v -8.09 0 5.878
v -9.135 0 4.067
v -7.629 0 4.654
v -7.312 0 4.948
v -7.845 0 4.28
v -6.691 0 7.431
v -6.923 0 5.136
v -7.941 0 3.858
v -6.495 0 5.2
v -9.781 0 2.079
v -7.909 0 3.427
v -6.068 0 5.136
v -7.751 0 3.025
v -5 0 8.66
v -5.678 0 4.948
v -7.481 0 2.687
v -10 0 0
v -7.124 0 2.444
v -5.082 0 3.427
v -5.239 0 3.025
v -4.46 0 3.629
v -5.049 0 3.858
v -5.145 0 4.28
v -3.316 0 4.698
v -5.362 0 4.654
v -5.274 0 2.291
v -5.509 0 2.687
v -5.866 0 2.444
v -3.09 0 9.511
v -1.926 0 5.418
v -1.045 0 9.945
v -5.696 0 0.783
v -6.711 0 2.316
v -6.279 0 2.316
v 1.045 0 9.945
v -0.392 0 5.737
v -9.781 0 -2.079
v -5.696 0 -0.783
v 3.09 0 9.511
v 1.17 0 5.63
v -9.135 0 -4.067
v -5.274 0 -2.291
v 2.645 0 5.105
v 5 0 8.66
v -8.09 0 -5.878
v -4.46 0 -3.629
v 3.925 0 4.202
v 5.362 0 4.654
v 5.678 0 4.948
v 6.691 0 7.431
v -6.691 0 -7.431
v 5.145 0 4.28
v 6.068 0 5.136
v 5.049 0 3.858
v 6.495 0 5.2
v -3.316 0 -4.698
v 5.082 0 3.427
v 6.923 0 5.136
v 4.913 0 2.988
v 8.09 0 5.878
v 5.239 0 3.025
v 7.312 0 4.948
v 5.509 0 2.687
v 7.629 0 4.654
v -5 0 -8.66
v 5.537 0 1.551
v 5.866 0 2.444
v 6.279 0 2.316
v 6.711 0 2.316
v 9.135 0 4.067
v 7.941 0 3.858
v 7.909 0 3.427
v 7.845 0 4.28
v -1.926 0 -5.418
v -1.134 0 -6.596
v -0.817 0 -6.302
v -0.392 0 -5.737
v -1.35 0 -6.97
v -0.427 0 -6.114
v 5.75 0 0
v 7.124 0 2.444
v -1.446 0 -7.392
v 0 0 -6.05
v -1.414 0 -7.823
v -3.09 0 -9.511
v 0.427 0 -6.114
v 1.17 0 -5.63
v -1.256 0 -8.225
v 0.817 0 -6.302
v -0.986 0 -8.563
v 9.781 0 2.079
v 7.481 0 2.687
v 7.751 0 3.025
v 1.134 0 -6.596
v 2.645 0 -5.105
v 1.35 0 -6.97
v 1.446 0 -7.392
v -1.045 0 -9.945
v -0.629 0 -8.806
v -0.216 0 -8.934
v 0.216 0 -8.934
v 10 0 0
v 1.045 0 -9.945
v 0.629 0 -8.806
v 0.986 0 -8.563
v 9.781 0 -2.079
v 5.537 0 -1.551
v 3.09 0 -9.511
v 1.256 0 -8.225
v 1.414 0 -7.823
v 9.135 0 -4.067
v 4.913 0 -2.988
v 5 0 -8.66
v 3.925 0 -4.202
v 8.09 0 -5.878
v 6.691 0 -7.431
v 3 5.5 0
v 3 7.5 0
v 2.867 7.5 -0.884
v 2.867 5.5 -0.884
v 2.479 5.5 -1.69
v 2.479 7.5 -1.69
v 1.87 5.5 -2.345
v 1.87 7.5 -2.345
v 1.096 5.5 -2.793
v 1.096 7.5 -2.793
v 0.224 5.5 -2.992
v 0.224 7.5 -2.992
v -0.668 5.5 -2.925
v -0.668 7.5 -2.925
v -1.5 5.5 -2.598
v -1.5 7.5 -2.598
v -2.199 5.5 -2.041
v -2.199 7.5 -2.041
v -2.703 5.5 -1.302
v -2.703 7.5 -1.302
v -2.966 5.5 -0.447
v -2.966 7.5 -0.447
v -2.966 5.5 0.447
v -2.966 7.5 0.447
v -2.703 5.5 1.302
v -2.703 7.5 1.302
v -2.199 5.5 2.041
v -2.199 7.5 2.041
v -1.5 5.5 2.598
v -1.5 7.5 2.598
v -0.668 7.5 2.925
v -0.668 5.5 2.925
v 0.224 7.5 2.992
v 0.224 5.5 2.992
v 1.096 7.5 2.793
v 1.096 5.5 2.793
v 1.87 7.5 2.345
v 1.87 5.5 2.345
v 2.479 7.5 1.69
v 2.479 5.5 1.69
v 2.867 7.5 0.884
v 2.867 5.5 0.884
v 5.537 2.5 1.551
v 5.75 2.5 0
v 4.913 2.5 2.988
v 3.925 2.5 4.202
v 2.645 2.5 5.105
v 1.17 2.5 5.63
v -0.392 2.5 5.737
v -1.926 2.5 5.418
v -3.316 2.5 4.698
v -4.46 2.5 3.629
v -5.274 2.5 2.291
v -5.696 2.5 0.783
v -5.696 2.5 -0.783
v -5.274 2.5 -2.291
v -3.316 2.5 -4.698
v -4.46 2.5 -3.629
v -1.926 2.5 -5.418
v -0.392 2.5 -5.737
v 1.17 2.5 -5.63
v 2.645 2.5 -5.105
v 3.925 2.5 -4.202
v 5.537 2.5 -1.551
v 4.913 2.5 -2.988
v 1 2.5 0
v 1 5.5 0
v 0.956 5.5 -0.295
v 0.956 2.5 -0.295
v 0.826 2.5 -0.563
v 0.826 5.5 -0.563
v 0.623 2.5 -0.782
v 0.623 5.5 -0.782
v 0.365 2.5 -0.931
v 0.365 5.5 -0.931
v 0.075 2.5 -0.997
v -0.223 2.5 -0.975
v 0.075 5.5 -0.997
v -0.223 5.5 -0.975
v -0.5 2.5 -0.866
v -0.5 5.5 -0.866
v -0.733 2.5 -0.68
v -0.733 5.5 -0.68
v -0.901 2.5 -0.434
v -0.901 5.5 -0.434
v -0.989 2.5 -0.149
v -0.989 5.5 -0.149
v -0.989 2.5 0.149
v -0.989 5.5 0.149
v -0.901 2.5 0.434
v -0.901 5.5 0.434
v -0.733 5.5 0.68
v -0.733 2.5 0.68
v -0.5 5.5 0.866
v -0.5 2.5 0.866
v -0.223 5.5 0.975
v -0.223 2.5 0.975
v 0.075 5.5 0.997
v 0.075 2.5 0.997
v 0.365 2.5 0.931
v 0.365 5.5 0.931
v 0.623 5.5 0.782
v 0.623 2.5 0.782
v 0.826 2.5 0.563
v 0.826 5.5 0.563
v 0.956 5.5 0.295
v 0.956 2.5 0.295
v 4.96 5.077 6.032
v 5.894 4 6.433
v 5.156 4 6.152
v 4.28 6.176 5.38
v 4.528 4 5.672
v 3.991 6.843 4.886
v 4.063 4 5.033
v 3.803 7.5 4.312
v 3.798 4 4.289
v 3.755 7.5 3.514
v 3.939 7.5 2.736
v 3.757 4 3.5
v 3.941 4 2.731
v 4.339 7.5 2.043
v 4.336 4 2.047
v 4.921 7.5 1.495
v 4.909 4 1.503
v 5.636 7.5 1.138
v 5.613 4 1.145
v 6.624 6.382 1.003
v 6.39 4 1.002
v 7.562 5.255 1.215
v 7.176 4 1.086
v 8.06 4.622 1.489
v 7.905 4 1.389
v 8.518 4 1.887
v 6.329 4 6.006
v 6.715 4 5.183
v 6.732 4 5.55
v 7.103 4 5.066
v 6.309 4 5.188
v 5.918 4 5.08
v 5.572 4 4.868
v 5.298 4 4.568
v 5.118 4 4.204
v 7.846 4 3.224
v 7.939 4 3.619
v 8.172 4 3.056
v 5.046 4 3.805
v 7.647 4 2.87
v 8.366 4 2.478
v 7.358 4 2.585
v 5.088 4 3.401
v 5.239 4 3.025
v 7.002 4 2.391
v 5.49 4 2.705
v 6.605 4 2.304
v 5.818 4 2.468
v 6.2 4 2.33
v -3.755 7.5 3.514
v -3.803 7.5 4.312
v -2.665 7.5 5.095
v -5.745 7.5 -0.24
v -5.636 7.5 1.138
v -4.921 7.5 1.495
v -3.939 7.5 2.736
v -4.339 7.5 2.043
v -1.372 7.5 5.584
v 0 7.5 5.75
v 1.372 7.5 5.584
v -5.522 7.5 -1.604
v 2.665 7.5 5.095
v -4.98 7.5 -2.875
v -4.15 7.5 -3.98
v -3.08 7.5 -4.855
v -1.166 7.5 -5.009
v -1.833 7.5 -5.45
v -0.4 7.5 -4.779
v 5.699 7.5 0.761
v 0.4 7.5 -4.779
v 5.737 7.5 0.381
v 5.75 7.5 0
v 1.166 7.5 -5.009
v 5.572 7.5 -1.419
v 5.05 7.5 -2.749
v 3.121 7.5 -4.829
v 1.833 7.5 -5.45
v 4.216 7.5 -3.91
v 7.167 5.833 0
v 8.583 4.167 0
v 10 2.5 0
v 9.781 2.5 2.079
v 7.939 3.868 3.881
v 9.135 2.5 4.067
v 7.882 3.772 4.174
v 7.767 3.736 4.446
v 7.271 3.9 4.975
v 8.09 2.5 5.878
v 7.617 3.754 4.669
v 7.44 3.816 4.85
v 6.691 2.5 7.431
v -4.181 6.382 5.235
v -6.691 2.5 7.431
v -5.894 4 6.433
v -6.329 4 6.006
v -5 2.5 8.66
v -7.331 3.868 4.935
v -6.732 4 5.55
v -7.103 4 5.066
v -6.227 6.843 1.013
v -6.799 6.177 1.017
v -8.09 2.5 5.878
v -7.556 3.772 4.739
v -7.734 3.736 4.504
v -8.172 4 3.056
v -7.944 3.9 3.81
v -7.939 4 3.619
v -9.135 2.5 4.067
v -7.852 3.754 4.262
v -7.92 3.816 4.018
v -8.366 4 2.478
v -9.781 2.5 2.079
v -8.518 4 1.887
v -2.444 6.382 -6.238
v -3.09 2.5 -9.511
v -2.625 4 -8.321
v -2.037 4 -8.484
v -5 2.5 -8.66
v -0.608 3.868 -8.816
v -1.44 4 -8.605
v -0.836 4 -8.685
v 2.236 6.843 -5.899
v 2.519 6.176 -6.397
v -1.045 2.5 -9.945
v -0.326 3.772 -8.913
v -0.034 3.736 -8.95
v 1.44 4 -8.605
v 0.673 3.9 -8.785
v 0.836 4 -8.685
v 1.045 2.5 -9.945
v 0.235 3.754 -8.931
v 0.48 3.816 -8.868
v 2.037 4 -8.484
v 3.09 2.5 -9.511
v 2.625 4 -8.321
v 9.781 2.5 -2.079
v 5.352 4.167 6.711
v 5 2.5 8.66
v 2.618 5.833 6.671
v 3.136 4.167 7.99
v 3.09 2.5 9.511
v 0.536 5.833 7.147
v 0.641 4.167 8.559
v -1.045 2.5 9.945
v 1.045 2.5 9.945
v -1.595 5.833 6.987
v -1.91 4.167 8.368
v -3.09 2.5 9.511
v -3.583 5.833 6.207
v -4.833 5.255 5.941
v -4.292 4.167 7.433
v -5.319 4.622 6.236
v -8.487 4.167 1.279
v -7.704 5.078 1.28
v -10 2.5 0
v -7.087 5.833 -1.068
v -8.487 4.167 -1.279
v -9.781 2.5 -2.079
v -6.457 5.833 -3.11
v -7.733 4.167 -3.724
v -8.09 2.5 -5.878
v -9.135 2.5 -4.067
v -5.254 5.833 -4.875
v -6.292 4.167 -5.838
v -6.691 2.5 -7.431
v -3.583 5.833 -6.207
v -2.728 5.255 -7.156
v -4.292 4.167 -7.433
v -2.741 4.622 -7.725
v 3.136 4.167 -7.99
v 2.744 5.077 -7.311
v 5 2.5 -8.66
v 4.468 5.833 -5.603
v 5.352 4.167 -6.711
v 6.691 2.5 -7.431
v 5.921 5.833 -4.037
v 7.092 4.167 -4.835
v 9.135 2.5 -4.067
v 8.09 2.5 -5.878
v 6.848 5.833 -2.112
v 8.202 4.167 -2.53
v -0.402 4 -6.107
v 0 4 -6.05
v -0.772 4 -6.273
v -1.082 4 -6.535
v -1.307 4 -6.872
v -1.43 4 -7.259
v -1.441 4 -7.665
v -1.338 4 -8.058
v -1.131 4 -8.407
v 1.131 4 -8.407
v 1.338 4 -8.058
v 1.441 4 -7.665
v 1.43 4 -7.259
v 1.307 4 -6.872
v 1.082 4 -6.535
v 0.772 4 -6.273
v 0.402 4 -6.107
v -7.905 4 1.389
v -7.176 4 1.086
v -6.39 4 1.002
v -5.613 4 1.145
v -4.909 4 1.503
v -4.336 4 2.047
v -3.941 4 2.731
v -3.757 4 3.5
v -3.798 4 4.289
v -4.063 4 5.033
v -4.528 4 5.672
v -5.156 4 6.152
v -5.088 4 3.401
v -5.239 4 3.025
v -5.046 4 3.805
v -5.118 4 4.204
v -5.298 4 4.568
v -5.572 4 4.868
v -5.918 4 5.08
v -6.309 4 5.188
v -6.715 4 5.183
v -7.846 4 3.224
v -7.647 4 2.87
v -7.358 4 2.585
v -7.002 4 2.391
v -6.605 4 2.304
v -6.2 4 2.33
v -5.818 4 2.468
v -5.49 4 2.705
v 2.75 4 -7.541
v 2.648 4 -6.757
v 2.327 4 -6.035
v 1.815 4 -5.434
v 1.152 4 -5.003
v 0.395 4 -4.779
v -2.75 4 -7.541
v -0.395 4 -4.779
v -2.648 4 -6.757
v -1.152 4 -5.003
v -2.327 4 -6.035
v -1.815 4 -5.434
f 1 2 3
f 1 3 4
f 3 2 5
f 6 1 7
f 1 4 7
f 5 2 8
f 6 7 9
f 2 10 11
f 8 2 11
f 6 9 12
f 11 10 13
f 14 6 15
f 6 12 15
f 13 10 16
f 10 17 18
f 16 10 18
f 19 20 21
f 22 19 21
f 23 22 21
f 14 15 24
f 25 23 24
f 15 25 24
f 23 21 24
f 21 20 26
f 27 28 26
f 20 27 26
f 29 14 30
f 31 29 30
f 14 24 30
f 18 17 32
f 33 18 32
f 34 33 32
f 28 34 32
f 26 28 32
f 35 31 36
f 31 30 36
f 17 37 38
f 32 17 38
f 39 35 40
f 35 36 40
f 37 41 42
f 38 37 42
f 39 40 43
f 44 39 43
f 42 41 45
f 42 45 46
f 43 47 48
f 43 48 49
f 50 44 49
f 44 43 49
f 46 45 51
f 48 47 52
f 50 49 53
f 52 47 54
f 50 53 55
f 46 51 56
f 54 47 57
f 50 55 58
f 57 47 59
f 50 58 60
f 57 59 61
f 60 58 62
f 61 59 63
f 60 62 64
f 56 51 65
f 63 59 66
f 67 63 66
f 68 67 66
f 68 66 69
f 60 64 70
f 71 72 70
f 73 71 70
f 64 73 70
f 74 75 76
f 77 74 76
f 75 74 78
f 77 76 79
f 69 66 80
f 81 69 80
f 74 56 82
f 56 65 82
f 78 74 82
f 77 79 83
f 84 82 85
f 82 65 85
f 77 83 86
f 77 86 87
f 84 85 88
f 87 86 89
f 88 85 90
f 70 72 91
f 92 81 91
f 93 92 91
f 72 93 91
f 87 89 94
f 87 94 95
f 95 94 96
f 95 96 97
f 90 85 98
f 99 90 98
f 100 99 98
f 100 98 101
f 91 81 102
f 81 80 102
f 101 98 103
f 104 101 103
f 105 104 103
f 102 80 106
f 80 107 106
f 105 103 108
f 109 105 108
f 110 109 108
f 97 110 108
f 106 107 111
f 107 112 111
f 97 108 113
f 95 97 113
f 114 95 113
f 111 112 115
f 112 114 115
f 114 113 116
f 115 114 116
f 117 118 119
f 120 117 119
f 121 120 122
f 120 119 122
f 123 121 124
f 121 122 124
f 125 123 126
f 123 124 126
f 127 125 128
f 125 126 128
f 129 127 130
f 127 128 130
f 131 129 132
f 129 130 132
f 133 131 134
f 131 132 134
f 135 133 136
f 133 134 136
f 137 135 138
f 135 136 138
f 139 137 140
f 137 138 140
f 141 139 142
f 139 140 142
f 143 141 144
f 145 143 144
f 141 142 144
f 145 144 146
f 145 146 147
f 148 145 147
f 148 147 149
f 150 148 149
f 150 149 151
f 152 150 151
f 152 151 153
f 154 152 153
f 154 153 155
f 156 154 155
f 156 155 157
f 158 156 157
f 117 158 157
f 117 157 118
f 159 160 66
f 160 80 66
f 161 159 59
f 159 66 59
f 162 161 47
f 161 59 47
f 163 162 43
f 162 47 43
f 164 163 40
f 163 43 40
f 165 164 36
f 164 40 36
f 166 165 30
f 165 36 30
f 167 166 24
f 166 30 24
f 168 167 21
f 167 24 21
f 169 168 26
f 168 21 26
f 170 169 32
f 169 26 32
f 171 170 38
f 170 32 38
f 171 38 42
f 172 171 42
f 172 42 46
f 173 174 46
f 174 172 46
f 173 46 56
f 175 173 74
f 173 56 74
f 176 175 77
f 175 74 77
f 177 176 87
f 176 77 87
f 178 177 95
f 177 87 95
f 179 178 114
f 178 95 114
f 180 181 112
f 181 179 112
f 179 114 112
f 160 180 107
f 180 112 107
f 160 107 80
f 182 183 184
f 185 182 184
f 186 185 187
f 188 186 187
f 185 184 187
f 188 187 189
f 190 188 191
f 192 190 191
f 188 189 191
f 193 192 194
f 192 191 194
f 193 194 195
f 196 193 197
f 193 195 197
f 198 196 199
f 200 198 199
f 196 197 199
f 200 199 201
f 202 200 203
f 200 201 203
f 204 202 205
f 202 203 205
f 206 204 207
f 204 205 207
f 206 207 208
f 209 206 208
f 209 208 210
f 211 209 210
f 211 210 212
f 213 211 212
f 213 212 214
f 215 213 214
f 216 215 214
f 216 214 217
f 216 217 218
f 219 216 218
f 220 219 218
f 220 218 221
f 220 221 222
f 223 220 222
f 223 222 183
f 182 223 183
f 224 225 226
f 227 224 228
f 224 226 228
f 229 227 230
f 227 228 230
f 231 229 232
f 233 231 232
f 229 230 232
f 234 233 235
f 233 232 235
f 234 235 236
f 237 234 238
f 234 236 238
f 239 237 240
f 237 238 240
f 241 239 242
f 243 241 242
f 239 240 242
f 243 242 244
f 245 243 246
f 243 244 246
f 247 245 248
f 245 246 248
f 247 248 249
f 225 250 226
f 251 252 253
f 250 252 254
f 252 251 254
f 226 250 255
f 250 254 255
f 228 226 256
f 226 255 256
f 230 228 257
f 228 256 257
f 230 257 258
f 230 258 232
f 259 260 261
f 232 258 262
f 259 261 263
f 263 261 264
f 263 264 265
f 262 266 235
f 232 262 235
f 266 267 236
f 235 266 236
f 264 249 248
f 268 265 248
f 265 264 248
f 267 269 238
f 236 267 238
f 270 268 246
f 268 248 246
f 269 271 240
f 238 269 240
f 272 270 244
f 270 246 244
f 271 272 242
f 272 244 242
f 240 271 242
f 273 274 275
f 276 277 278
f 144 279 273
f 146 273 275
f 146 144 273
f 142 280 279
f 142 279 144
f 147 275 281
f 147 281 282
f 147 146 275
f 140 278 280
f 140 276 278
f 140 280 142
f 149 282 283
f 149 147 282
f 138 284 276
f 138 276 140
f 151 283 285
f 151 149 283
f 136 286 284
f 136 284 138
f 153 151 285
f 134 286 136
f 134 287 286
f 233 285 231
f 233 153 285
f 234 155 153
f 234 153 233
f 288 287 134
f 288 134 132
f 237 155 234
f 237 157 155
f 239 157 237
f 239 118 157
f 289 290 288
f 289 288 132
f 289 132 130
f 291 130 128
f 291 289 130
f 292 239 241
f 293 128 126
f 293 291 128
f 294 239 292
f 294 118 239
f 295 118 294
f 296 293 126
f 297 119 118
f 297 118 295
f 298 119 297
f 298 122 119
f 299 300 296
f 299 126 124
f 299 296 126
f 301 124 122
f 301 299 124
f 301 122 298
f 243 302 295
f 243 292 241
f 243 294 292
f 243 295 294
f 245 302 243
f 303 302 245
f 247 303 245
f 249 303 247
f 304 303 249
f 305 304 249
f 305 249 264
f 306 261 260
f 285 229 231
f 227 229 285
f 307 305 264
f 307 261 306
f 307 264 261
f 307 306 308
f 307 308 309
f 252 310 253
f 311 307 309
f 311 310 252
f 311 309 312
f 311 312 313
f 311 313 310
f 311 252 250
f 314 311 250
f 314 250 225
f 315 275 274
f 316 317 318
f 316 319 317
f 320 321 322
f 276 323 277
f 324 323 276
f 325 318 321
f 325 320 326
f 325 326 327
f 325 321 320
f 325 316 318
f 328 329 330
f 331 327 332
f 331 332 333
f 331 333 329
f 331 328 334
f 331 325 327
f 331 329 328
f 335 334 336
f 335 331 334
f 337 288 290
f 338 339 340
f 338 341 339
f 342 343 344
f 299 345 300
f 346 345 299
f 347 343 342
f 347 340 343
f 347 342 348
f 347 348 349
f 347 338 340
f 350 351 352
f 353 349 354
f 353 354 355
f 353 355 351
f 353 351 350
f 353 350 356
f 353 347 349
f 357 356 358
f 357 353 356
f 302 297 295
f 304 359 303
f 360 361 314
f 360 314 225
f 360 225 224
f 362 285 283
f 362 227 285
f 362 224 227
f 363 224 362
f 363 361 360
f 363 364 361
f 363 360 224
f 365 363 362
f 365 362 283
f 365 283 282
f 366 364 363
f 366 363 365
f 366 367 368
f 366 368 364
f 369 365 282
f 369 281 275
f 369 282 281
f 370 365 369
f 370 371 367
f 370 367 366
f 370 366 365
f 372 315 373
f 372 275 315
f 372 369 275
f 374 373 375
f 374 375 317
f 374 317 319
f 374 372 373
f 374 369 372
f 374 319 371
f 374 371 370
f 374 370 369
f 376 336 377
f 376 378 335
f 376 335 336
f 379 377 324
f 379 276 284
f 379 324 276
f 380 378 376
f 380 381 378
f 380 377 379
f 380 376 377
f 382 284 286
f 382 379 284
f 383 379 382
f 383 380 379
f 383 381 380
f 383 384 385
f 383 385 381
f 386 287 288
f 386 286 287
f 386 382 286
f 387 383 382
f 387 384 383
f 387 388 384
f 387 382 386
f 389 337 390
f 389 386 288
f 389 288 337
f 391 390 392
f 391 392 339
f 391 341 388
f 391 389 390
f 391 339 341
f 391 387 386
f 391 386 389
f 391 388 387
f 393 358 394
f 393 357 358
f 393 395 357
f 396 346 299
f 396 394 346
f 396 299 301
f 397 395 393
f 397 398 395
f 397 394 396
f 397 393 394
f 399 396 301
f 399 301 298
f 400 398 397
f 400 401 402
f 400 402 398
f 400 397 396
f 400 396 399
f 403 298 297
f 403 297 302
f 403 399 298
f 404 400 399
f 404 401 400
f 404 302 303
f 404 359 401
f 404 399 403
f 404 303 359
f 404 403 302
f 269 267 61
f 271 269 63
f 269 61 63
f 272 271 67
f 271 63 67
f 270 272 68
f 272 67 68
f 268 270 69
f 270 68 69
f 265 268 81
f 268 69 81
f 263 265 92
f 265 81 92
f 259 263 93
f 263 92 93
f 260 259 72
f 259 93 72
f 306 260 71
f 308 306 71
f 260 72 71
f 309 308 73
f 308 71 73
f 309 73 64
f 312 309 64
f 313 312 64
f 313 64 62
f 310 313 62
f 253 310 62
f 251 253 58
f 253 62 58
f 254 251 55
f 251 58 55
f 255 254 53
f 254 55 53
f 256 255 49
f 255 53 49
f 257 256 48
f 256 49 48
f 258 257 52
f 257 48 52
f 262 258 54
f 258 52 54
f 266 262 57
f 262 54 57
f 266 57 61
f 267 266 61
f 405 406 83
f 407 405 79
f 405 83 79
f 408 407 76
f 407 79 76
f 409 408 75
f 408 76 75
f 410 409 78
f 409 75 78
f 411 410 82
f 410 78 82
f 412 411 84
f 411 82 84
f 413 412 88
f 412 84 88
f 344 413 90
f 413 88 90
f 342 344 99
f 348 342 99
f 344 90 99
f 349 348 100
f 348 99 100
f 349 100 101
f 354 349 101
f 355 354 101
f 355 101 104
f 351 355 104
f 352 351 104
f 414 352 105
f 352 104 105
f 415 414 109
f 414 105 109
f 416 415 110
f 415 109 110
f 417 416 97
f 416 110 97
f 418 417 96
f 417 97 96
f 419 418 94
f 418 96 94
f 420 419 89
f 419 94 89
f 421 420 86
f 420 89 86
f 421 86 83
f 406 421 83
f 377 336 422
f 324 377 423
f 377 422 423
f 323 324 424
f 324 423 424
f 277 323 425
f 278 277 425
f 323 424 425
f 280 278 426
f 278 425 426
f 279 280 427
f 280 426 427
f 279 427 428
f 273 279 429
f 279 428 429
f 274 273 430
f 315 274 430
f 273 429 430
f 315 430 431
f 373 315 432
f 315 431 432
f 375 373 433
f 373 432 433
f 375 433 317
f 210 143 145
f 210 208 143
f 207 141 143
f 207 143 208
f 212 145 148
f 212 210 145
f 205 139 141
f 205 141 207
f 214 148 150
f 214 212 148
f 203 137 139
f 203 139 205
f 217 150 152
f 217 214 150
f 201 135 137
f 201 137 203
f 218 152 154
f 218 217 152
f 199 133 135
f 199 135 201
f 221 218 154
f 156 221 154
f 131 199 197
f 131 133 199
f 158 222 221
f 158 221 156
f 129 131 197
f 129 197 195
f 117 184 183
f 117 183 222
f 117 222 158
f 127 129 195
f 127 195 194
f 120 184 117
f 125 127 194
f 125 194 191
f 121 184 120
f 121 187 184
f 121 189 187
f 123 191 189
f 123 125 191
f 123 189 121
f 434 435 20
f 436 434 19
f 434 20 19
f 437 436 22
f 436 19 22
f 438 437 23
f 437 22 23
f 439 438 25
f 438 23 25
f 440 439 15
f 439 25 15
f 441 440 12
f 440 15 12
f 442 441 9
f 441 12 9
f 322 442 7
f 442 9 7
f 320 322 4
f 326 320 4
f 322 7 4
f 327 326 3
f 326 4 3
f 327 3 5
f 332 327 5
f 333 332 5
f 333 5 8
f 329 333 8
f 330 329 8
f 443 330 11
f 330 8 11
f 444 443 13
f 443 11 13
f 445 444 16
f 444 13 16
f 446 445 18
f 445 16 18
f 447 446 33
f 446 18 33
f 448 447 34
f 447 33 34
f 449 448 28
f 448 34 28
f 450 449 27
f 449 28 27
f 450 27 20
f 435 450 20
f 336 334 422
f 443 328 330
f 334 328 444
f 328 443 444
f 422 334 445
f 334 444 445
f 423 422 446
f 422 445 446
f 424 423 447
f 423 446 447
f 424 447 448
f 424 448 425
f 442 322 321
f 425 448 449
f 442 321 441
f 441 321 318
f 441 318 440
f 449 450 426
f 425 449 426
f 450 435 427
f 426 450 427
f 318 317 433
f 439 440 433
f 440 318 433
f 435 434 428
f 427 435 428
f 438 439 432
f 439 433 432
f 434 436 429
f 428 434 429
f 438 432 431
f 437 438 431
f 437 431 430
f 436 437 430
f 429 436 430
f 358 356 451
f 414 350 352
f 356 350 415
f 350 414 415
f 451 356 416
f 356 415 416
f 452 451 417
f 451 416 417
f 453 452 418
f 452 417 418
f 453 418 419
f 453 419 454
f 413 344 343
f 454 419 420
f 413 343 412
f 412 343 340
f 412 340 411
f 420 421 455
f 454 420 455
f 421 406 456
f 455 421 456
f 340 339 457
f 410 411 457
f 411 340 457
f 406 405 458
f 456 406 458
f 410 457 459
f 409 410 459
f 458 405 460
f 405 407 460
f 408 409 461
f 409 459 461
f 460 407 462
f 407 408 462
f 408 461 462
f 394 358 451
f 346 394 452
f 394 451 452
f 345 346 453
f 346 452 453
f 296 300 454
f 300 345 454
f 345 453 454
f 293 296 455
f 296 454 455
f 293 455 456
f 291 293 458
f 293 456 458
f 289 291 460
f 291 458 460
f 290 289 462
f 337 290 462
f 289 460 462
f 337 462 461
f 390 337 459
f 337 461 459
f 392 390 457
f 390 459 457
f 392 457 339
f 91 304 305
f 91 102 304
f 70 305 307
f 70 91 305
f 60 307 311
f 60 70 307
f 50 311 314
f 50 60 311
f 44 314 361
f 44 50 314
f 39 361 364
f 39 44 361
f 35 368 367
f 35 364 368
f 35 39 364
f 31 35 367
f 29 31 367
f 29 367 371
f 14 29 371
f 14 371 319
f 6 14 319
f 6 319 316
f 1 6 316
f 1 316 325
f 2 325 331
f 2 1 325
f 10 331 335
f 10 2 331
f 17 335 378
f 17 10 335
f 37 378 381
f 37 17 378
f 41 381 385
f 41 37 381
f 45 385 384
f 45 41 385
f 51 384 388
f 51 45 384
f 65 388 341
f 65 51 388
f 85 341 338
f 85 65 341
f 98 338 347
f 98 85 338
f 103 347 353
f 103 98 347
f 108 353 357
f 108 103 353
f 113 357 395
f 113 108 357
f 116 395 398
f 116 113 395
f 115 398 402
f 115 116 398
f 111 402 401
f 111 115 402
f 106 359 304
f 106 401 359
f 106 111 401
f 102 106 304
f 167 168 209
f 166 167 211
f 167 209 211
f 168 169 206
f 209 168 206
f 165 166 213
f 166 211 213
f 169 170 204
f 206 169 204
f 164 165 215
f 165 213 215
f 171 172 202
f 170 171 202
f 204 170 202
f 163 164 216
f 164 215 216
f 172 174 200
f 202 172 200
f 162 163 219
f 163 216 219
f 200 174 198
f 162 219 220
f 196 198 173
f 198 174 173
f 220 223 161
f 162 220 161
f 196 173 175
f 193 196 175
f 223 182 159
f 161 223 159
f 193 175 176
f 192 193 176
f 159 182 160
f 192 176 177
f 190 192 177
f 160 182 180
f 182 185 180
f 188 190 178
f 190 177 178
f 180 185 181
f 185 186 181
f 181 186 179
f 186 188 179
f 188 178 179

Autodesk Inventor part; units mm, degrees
ref_plane "YZ Plane" through (0, 0, 0) normal (1, 0, 0) x (0, 1, 0)
ref_plane "XZ Plane" through (0, 0, 0) normal (0, 1, 0) x (-1, 0, 0)
ref_plane "XY Plane" through (0, 0, 0) normal (0, 0, 1) x (1, 0, 0)
sketch "Sketch2" plane through (0, 0, 0) normal (0, 0, 1) x (1, 0, 0)
  line L0 (1, 2.5) -> (1, 5.5)
  line L1 (1, 5.5) -> (3, 5.5)
  line L2 (3, 5.5) -> (3, 7.5)
  line L3 (3, 7.5) -> (5.75, 7.5)
  line L4 (5.75, 7.5) -> (10, 2.5)
  line L5 (10, 2.5) -> (10, 0)
  line L6 (1, 2.5) -> (5.75, 2.5)
  line L7 (5.75, 2.5) -> (5.75, 0)
  line L8 (5.75, 0) -> (10, 0)
  line L9 (0, 0) -> (0, 19.425)
  dimension "d0" = 6
  dimension "d1" = 2
  dimension "d2" = 11.5
  dimension "d3" = 20
  dimension "d4" = 2.5
  dimension "d5" = 3
  dimension "d6" = 2
revolve "Revolution1" add sketch "Sketch2" angle 360 about axis through (0, 0, 0) along (0, 1, 0)
sketch "Sketch3" plane through (0, 7.5, 0) normal (0, 1, 0) x (1, 0, 0)
  point P0 (0, 0)
  point P1 (0, 7.5)
  dimension "d8" = 7.5
hole "Hole1" at (0, 7.5, -7.5) direction (0, -1, 0) diameter 2.9 end through all counterbore diameter 5.5 counterbore depth 3.5 clearance for "Socket Head Cap Screw DIN EN ISO 4762" size "M2.5" standard "DIN"
pattern_circular "Circular Pattern1" count 3 over 360 about axis through (0, -10, 0) along (0, 1, 0) of "Hole1"
properties part number "902-4250 magnet hold"
